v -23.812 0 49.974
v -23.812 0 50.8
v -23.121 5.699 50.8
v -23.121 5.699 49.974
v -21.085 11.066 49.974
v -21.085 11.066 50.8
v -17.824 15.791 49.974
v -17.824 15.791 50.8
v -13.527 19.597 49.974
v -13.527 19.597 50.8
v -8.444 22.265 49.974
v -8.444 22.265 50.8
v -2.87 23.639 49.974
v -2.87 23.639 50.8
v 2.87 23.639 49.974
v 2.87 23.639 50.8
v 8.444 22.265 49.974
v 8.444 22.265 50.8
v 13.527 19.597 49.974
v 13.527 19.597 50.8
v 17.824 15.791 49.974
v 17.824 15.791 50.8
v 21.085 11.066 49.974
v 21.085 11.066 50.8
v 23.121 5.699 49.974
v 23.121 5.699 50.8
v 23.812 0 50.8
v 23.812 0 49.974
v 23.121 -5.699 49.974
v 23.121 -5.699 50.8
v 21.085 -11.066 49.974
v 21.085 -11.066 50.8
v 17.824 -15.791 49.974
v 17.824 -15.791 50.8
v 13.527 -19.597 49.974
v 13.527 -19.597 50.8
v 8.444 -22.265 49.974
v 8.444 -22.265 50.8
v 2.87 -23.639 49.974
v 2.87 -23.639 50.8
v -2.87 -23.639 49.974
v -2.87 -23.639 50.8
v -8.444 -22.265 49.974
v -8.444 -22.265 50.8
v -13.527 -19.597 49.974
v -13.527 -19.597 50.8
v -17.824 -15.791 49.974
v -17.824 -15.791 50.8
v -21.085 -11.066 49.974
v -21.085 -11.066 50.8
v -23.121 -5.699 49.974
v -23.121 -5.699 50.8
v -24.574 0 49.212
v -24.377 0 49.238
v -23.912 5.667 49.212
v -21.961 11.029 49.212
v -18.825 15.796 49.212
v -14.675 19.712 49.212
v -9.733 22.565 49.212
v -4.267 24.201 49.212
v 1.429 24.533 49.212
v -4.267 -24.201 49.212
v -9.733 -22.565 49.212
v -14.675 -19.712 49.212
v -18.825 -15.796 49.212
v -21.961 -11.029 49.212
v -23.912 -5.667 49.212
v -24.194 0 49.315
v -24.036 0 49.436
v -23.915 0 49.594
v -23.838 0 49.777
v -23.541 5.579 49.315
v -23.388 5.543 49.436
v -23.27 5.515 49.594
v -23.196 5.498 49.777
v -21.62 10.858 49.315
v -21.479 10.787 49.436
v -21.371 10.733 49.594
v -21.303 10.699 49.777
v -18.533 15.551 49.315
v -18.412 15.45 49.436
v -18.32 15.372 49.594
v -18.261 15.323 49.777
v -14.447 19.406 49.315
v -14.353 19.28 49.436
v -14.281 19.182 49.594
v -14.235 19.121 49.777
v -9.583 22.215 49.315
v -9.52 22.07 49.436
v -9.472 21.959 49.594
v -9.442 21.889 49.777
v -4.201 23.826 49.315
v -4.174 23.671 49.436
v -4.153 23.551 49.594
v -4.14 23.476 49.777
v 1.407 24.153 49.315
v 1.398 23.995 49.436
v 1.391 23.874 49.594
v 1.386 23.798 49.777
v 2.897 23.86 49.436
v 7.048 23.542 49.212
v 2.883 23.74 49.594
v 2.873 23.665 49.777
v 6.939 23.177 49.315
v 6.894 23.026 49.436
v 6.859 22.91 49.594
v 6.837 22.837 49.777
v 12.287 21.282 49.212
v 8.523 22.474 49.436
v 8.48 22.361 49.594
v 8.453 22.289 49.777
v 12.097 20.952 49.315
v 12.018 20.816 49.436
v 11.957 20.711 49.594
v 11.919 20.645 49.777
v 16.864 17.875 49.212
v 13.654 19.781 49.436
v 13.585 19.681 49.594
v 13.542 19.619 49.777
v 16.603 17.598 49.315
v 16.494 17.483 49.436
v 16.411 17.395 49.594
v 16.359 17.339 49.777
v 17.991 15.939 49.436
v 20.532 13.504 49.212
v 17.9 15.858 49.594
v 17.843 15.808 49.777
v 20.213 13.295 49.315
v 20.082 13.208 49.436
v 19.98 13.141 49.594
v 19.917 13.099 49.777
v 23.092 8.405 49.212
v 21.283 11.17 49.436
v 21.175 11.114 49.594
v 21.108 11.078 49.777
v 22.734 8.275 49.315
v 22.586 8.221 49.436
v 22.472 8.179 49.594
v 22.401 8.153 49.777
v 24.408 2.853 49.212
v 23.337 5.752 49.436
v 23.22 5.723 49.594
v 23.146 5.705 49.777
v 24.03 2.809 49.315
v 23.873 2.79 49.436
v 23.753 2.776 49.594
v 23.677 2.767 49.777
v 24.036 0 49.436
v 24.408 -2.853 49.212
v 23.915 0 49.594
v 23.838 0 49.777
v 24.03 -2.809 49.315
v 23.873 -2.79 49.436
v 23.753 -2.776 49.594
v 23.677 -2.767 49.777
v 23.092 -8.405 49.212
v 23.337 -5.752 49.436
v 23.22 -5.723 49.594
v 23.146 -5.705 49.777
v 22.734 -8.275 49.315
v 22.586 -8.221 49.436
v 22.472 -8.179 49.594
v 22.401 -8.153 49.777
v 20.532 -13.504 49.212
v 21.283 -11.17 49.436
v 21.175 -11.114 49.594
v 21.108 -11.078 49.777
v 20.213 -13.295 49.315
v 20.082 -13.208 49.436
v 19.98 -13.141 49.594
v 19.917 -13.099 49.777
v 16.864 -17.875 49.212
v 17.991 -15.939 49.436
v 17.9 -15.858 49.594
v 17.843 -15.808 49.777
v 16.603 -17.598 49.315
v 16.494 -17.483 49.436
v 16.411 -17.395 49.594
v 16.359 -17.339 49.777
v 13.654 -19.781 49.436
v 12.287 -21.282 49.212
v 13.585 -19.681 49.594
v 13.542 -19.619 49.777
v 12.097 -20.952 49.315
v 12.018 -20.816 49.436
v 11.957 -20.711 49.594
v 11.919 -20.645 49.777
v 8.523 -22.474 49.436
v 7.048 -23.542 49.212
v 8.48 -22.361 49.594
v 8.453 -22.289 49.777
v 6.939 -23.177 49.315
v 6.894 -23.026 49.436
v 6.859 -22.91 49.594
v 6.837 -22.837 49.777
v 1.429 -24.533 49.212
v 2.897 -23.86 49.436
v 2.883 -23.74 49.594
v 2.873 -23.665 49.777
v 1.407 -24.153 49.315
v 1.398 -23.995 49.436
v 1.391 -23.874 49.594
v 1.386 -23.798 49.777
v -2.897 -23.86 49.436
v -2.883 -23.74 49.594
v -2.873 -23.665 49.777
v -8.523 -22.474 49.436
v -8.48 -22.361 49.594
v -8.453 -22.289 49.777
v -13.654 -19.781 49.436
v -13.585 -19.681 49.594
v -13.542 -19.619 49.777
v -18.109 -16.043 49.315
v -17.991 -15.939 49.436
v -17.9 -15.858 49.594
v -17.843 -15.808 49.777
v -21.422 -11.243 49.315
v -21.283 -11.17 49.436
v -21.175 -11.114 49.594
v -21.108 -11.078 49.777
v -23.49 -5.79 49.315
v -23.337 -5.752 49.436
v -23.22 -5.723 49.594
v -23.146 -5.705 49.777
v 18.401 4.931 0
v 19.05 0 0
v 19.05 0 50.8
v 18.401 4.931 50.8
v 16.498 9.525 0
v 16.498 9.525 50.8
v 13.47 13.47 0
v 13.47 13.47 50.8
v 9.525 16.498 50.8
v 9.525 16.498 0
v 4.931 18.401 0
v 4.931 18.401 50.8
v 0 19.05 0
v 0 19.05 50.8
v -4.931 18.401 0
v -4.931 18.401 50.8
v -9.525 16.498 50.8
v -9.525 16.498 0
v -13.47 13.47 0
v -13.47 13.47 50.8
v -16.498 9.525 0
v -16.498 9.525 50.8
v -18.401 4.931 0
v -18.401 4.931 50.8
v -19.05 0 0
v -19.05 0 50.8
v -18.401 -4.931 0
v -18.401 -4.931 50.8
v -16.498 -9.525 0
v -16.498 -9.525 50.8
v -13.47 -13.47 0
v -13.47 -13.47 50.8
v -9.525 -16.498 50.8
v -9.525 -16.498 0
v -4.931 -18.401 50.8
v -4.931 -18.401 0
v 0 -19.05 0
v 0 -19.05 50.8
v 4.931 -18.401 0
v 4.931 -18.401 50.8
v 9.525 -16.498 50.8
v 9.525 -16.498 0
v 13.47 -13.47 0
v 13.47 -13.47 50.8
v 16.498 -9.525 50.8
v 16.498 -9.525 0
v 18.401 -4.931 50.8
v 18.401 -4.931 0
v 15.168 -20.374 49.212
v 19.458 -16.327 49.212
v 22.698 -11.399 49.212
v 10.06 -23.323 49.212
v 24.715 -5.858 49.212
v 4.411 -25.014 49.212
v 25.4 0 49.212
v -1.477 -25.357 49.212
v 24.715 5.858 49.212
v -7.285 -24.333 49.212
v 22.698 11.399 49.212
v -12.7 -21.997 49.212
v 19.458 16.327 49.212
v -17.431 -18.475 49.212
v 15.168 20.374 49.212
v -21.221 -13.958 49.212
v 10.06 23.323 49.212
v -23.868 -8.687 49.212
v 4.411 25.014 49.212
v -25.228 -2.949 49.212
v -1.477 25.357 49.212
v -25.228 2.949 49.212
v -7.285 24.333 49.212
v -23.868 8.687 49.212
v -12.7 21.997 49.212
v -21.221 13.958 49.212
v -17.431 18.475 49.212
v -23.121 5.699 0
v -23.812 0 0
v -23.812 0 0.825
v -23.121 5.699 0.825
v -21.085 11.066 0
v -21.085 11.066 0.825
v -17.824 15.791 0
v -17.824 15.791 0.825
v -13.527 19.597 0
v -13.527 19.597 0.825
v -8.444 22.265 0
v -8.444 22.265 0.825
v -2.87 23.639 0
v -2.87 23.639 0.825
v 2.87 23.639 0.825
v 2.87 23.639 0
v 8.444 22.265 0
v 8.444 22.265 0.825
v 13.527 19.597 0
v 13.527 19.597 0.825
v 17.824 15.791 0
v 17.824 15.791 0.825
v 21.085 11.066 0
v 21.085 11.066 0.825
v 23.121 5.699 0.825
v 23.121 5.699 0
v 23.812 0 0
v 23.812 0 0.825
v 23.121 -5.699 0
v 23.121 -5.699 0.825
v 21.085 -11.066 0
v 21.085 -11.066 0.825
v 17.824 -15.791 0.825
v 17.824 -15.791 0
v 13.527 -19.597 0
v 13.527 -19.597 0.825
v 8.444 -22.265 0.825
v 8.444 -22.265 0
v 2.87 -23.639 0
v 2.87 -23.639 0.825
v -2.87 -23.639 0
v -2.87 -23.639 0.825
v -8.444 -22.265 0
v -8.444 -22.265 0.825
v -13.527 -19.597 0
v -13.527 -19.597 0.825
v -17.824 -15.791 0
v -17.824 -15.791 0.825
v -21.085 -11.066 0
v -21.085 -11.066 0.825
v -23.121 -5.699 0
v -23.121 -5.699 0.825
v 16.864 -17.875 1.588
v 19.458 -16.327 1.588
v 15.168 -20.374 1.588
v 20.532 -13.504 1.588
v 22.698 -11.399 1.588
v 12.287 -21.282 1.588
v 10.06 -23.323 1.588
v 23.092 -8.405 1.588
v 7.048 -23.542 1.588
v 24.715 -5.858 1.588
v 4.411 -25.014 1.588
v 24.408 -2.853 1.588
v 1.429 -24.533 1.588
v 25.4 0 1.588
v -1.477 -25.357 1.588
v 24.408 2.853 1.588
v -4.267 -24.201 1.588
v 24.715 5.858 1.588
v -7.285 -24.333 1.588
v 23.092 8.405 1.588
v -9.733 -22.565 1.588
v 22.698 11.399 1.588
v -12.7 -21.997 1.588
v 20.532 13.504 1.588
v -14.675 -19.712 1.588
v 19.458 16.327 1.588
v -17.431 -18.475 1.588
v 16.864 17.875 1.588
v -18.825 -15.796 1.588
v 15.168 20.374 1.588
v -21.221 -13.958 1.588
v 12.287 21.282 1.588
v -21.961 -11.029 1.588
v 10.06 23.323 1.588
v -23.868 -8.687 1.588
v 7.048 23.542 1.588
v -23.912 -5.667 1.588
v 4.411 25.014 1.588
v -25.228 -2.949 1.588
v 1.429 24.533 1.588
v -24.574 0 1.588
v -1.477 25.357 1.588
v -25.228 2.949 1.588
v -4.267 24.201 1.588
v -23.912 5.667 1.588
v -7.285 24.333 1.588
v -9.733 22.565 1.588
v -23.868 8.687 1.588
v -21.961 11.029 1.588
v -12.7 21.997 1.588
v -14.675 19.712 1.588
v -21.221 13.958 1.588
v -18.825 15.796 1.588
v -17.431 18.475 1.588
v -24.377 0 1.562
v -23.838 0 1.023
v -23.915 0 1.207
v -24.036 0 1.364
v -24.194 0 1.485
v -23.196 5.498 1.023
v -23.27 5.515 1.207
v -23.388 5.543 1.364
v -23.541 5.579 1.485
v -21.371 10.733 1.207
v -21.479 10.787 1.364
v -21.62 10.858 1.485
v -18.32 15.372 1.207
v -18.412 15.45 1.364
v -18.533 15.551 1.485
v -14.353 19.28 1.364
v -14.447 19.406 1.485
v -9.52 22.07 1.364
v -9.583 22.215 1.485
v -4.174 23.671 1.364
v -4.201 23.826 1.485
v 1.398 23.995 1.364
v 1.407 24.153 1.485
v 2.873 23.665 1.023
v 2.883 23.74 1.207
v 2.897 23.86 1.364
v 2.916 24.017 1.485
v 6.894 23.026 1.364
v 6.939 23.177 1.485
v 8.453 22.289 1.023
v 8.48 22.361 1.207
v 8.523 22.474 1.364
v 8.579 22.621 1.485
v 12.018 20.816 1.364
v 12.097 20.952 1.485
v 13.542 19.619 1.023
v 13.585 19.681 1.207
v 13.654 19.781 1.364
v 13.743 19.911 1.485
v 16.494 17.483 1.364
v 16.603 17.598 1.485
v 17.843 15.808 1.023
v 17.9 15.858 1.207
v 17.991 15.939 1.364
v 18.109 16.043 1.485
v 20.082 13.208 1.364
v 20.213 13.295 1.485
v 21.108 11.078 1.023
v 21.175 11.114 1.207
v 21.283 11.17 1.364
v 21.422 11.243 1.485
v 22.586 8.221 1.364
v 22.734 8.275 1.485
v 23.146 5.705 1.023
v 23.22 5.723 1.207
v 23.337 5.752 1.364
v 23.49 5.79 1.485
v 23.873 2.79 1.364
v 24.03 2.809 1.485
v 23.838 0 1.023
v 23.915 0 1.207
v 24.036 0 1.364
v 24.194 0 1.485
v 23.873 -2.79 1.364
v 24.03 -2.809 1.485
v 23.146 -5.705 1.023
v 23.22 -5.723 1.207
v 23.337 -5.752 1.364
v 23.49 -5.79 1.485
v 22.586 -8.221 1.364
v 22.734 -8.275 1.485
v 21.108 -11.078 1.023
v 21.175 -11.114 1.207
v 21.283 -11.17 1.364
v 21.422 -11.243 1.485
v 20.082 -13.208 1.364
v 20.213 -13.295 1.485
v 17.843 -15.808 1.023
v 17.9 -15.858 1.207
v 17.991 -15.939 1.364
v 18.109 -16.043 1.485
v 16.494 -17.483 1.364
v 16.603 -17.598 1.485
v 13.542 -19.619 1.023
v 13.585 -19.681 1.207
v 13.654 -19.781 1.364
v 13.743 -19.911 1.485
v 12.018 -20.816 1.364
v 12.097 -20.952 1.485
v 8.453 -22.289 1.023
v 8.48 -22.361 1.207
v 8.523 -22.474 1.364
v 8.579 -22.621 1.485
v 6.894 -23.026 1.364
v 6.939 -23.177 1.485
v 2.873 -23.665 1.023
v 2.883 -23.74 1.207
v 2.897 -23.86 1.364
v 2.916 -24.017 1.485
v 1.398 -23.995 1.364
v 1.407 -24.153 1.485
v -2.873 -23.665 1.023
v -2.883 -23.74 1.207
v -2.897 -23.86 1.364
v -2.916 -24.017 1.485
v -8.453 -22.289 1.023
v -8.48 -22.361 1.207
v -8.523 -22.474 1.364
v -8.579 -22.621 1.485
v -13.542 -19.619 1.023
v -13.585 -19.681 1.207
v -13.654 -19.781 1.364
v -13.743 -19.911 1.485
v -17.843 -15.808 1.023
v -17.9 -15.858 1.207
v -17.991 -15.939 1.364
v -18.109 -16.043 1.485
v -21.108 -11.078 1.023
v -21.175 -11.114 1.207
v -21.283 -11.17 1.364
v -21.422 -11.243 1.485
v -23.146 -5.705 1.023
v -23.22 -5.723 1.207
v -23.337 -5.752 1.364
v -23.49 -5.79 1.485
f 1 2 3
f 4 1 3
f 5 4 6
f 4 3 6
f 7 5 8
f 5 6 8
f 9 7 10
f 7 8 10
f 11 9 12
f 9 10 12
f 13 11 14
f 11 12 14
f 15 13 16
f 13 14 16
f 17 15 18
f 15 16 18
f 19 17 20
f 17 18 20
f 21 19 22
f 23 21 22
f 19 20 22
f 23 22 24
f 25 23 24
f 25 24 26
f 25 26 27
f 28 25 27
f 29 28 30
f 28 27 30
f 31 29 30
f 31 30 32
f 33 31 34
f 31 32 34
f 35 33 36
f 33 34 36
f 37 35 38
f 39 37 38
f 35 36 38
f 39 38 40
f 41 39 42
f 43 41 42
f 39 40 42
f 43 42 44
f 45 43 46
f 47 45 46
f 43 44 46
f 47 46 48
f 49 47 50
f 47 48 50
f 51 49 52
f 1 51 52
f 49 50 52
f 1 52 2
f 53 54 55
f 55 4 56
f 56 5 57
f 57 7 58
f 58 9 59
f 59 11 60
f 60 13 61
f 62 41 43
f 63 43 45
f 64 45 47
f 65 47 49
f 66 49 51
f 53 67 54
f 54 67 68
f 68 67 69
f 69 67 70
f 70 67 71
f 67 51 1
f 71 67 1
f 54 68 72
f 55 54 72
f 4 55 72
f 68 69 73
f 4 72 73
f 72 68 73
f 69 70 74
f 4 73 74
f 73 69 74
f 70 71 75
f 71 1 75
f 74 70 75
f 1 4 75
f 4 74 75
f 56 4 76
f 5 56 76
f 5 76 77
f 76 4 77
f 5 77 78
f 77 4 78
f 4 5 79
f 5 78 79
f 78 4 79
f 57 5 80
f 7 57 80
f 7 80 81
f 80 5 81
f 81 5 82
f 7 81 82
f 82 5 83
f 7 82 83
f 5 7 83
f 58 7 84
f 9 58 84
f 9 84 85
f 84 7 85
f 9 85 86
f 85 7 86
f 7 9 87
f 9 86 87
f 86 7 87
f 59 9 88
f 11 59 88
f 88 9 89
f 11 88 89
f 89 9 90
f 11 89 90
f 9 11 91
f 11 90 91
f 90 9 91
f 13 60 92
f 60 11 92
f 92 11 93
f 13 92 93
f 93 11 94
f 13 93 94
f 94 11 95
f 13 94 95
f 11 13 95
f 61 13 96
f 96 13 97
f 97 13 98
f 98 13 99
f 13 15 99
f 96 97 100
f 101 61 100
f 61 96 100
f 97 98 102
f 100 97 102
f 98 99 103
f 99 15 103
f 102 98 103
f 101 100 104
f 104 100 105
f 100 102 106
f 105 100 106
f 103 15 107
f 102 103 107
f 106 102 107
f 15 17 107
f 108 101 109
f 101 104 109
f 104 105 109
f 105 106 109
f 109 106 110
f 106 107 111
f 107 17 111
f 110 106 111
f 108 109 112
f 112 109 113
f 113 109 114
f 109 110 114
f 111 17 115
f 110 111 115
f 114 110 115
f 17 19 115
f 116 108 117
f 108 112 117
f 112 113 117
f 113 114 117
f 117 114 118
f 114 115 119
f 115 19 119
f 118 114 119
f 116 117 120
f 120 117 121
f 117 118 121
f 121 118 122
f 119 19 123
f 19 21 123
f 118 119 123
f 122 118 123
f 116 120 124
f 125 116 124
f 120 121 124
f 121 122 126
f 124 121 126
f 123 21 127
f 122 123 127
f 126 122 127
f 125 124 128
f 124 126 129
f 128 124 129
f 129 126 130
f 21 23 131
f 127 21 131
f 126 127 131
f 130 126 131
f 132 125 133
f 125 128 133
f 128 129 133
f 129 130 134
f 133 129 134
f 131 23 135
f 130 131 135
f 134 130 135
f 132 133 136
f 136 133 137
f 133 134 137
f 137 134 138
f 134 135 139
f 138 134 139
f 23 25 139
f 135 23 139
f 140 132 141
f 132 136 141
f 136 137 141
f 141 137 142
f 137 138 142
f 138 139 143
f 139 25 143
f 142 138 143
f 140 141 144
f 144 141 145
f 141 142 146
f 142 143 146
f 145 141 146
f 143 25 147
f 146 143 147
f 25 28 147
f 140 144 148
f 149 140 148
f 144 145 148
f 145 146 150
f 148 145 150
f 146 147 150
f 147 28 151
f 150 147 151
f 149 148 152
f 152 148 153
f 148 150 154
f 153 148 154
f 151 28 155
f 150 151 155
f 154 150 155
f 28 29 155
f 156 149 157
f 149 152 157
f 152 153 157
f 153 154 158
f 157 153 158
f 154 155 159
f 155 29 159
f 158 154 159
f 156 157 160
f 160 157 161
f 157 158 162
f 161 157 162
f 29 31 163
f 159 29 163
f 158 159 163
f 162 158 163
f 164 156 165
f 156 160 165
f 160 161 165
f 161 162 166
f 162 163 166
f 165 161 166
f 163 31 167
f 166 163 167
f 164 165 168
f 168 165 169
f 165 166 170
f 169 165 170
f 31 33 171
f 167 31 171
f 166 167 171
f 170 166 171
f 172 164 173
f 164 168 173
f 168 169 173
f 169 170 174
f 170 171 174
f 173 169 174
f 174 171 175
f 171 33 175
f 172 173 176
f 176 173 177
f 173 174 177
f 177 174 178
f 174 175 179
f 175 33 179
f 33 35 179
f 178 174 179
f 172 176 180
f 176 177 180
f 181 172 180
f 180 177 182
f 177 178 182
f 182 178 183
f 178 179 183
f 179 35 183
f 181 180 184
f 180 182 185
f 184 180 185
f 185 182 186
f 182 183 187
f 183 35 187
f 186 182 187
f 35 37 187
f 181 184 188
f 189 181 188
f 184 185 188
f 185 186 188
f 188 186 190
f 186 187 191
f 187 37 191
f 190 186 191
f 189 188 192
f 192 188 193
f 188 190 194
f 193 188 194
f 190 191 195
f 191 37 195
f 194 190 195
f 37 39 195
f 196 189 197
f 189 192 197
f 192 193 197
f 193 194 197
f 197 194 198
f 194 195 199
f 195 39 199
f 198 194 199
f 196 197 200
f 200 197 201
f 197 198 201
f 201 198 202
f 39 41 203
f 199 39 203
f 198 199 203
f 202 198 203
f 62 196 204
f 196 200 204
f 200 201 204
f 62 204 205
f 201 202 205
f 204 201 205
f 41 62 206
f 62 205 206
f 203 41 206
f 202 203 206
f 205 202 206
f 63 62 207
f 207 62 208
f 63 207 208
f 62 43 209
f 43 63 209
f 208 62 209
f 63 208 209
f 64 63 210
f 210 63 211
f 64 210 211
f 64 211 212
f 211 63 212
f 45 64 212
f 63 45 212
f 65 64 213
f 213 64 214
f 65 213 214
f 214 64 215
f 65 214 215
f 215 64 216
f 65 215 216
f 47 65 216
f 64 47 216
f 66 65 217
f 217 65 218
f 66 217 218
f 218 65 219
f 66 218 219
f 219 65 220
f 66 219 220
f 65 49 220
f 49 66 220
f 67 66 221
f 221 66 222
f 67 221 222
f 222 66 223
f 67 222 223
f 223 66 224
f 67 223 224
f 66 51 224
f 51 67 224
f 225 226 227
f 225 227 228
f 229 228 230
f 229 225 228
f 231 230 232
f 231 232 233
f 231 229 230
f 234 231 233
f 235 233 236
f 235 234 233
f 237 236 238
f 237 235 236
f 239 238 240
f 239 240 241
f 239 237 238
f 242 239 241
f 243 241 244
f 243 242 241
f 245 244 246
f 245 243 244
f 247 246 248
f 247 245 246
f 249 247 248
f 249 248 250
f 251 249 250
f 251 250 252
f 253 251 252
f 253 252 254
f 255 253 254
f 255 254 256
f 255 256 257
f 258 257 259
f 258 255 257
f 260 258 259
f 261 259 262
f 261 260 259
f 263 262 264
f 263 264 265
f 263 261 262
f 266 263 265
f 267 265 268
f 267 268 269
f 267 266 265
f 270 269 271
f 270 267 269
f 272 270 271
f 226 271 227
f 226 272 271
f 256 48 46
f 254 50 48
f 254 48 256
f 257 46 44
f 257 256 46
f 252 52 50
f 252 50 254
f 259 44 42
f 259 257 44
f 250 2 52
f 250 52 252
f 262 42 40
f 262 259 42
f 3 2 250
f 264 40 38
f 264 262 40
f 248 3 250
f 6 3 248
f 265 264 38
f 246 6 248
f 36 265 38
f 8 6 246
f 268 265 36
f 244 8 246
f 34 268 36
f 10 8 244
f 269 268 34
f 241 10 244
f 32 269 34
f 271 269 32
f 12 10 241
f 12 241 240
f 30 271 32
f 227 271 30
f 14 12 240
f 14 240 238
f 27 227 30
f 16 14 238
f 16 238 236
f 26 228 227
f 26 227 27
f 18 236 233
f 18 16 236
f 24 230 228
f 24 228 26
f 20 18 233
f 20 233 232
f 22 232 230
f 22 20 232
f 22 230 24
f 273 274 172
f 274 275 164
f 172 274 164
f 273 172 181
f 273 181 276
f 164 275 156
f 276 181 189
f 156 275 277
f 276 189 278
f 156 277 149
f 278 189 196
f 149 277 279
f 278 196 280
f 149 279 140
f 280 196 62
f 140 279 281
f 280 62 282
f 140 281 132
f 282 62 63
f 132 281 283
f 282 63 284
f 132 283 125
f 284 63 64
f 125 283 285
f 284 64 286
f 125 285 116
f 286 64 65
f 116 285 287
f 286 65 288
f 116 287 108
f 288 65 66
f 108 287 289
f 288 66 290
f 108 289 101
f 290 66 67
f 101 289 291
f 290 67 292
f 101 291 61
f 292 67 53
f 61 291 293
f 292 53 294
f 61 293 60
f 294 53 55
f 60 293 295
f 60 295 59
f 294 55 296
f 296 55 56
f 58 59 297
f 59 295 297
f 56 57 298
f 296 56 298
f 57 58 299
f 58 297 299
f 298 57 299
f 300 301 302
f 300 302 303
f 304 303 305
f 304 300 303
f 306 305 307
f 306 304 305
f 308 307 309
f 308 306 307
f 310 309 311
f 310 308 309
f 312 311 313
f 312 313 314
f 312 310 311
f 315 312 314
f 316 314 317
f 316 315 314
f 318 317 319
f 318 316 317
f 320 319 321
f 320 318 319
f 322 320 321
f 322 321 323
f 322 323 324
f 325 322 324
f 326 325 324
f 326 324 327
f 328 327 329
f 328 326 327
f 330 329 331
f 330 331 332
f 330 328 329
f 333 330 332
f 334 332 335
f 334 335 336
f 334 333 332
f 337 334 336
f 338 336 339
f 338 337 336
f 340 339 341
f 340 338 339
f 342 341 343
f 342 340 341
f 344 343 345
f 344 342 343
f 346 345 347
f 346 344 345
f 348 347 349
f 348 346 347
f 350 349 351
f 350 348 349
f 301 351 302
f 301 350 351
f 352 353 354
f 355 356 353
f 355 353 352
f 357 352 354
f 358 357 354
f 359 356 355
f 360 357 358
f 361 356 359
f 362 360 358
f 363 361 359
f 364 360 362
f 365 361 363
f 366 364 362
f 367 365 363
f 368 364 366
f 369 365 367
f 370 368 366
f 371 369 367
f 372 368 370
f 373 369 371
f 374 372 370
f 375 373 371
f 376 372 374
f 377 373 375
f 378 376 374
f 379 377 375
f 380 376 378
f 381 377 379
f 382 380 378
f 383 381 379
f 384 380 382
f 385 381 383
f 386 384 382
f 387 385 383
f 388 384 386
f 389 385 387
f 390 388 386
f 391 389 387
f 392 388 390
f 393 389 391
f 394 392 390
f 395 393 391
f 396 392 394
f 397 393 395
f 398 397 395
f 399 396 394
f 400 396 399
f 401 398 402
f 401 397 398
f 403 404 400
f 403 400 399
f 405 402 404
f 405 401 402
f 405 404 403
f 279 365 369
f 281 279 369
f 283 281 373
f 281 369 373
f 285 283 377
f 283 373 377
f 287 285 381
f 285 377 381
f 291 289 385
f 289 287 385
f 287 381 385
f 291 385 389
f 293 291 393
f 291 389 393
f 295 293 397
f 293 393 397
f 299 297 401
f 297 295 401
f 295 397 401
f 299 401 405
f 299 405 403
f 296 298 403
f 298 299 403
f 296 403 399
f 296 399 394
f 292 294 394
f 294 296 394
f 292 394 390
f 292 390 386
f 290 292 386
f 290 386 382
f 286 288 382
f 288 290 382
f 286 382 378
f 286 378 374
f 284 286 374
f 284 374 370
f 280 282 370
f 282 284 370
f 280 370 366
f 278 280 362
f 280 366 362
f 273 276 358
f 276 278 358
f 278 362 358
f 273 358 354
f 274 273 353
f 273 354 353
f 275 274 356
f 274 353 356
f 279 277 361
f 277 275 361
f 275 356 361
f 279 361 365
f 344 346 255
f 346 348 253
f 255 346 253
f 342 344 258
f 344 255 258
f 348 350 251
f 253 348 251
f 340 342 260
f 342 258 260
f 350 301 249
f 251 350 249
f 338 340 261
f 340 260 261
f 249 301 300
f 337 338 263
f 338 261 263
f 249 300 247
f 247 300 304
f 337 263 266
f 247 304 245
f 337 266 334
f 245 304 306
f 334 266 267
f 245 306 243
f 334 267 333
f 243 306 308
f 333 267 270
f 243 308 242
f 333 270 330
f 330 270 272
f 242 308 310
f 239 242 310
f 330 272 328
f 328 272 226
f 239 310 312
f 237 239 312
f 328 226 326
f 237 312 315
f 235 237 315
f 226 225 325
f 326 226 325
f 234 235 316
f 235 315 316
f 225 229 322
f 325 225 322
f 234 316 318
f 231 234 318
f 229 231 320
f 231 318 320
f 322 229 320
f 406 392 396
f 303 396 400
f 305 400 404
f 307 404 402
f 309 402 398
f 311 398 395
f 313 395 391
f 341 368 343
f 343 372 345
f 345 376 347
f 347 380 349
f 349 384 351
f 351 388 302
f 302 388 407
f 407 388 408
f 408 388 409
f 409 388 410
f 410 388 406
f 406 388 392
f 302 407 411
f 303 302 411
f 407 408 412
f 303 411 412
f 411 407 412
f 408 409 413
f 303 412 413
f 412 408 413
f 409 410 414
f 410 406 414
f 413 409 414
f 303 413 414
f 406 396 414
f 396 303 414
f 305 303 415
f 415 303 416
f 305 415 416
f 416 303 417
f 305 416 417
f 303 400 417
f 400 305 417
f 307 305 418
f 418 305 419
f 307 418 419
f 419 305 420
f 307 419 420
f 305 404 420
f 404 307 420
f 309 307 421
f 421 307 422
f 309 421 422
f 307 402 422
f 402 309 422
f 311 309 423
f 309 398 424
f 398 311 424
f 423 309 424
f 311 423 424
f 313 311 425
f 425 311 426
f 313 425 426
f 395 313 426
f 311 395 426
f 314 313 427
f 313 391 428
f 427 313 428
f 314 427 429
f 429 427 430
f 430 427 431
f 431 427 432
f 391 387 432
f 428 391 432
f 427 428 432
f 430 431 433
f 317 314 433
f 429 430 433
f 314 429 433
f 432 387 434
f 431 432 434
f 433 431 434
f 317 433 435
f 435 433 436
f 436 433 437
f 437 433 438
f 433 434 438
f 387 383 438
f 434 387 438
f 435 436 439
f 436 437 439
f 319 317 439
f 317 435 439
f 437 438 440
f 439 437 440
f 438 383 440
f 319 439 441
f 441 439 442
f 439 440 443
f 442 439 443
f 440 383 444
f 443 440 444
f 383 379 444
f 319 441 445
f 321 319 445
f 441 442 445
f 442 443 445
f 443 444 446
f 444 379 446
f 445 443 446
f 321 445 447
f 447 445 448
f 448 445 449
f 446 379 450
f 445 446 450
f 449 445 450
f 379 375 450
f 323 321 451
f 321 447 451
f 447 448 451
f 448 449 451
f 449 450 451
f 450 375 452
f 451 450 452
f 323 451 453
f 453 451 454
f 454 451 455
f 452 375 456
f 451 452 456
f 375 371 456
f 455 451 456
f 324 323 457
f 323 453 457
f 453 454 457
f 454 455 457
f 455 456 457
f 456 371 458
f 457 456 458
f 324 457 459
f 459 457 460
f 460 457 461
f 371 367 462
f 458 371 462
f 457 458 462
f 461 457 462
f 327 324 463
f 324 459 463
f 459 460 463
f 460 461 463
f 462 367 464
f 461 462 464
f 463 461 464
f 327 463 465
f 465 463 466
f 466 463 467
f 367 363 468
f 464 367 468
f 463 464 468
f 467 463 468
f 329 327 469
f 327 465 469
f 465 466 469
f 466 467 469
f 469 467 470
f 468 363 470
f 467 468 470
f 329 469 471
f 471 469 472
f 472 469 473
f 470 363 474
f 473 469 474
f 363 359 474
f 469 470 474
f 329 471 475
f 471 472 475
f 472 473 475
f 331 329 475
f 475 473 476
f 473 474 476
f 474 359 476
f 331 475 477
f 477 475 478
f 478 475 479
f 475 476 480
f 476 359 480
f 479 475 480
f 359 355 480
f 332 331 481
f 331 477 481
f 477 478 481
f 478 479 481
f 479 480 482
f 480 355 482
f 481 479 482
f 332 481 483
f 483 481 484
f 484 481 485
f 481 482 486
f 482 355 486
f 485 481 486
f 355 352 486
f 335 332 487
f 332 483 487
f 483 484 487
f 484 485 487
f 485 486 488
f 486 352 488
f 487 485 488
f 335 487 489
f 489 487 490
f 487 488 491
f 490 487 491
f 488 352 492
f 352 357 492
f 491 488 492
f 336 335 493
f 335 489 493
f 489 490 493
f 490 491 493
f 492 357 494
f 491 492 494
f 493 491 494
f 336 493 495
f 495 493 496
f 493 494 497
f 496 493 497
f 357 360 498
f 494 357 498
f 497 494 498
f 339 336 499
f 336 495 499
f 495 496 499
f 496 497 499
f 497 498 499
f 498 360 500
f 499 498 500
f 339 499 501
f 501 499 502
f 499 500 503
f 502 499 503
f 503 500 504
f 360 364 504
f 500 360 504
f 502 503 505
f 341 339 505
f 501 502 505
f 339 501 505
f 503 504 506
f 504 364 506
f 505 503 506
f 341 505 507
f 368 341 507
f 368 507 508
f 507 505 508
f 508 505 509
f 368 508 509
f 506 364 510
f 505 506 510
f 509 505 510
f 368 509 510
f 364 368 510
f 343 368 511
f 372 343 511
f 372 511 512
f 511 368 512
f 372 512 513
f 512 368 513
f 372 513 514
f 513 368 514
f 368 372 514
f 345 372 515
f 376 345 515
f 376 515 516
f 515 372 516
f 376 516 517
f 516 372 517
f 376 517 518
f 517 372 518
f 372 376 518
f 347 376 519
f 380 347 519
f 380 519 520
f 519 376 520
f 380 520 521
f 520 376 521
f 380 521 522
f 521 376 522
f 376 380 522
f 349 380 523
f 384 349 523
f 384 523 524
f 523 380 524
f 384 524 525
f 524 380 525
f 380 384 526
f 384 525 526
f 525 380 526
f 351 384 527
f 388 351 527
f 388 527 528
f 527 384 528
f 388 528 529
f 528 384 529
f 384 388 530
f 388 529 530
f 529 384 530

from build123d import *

# Parameters (mm, degrees)
SKETCH1_R           = 25.4
SKETCH1_R_2         = 19.05
BOSS_EXTRUDE1_DEPTH = 50.8
SKETCH4_R           = 25.4
SKETCH4_R_2         = 23.8125
CUT_EXTRUDE1_DEPTH  = 1.5875
FILLET1_R           = 0.762


with BuildPart() as part:
    # Sketch1 → Boss-Extrude1 (new body)
    with BuildSketch(Plane.XY):
        Circle(SKETCH1_R)
        Circle(SKETCH1_R_2, mode=Mode.SUBTRACT)
    extrude(amount=BOSS_EXTRUDE1_DEPTH)

    # Sketch4 → Cut-Extrude1 (cut)
    with BuildSketch(Plane(origin=(0, 0, 0), x_dir=(-1, 0, 0), z_dir=(0, 0, -1))):
        Circle(SKETCH4_R)
        Circle(SKETCH4_R_2, mode=Mode.SUBTRACT)
    cut_extrude1 = extrude(amount=-CUT_EXTRUDE1_DEPTH, mode=Mode.SUBTRACT)

    # Mirror1: Cut-Extrude1 across plane
    add(cut_extrude1.mirror(Plane.XY.offset(25.4)), mode=Mode.SUBTRACT)

    # Fillet1
    fillet1_edges = [part.edges().sort_by_distance(p)[0] for p in [
        (23.8125, 0, 1.5875),
        (23.8125, 0, 49.2125),
    ]]
    fillet(fillet1_edges, radius=FILLET1_R)


solid = part.part
